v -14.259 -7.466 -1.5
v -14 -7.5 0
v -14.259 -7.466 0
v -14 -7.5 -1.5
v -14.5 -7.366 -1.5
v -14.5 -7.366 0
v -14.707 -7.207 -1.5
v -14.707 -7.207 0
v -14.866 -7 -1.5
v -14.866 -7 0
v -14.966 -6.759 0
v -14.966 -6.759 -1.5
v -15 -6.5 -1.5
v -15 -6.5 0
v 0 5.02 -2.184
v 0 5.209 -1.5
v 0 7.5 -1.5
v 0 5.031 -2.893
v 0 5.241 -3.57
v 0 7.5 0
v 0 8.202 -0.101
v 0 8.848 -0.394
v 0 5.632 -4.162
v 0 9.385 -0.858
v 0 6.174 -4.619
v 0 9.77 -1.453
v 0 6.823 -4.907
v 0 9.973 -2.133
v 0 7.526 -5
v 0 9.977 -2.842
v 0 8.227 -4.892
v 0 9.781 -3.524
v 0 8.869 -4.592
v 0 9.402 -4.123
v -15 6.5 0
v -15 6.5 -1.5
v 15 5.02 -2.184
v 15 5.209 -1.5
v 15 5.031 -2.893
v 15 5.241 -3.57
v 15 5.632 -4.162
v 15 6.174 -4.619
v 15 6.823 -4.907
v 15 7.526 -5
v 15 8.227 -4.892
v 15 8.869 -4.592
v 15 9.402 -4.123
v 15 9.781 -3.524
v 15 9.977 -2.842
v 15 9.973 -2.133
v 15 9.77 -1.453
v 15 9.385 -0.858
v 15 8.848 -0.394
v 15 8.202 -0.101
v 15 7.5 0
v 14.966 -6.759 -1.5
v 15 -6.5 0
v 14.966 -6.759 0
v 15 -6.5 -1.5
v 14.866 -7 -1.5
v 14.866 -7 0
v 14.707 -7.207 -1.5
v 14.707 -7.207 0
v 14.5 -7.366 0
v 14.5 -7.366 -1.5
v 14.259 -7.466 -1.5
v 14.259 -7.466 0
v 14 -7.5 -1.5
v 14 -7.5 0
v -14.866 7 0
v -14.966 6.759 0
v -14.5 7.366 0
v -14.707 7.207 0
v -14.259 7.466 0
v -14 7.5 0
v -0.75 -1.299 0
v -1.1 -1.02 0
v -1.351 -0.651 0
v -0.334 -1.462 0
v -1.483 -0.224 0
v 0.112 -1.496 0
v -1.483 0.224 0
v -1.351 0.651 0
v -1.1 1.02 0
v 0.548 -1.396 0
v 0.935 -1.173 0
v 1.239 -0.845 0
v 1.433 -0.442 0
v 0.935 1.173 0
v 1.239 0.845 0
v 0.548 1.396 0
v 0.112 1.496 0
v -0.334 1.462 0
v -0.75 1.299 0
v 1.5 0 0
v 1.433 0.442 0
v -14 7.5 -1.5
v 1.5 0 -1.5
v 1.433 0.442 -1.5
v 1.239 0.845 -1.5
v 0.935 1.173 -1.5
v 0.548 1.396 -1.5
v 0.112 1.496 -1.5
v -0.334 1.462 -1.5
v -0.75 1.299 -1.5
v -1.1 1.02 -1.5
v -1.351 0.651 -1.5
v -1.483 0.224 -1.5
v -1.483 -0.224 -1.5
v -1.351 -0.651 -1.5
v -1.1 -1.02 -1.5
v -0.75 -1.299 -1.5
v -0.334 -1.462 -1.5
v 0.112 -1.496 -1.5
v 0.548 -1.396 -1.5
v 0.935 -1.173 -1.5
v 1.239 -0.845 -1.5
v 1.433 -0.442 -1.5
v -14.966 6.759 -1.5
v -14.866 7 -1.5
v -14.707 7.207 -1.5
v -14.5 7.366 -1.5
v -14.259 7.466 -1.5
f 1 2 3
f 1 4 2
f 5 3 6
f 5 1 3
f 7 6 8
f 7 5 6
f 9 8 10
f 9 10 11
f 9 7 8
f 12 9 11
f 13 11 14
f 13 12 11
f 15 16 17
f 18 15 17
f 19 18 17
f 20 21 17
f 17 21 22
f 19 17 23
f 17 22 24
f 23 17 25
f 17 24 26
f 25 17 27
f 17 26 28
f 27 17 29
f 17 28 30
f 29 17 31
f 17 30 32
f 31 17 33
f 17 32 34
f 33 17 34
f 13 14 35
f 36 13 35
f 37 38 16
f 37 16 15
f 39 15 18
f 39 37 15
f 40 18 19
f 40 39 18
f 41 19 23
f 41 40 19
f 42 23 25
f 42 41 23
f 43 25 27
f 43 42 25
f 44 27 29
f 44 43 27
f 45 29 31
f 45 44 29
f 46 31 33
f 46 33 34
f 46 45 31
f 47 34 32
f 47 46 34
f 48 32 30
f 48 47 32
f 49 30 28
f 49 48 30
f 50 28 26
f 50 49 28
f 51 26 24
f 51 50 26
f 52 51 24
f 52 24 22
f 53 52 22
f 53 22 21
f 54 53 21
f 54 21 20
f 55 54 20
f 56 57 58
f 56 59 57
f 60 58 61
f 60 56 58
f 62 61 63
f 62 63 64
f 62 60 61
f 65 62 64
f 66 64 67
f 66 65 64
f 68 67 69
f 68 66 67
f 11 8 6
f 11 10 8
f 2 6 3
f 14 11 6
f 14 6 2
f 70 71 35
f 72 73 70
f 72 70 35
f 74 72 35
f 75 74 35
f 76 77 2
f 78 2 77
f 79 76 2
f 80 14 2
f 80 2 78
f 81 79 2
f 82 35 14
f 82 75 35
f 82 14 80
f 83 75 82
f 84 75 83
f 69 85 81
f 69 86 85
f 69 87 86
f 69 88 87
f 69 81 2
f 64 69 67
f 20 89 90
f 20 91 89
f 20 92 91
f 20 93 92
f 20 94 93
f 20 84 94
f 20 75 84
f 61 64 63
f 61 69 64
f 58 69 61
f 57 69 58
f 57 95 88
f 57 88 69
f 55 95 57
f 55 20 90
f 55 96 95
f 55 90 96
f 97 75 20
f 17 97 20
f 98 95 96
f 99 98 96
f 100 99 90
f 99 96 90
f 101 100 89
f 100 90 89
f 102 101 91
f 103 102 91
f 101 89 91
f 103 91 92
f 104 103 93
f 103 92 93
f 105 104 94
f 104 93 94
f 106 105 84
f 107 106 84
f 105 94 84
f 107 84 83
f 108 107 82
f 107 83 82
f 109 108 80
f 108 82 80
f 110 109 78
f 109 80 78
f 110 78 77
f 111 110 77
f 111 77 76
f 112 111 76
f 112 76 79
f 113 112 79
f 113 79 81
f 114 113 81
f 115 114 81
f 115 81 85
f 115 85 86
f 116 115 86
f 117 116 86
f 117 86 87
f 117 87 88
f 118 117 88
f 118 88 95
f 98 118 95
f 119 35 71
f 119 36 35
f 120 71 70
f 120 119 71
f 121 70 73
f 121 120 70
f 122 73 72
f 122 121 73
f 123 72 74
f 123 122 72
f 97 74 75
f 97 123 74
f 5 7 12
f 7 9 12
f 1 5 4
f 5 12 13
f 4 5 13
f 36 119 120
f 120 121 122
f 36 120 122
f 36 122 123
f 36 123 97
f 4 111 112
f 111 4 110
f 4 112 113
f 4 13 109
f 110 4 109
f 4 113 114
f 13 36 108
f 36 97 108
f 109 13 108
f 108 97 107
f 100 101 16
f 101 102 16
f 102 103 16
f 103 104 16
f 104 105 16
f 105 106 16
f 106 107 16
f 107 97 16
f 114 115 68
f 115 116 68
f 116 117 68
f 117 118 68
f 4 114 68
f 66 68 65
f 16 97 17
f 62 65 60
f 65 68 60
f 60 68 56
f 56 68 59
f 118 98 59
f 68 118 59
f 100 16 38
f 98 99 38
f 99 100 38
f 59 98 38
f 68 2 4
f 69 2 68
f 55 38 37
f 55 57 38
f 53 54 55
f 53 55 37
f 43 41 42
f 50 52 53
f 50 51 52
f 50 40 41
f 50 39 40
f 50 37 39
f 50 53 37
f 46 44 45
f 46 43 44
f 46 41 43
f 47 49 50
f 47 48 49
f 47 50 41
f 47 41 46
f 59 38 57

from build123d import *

# Parameters (mm, degrees)
SKETCH_1_W             = 30
SKETCH_1_H             = 15
SM_BASE_FLANGE_1_DEPTH = 1.5
SKETCH_6_R             = 2.5
EXTRUDE_1_DEPTH        = 15
SKETCH_7_R             = 1.5
CUT_EXTRUDE_1_DEPTH    = 15
FILLET_1_R             = 1


# Sheet-metal steps are written as plain solids
with BuildPart() as part:
    # Sketch 1 → 基体-法兰1 (new body)
    with BuildSketch(Plane.XY):
        Rectangle(SKETCH_1_W, SKETCH_1_H)
    extrude(amount=-SM_BASE_FLANGE_1_DEPTH)

    # 草图6 → 凸台-拉伸1 (add)
    with BuildSketch(Plane(origin=(15, 0, 0), x_dir=(0, 0, -1), z_dir=(1, 0, 0))):
        with Locations((2.5, 7.5)):
            Circle(SKETCH_6_R)
    extrude(amount=-EXTRUDE_1_DEPTH)

    # 草图7 → 切除-拉伸1 (cut)
    with BuildSketch(Plane.XY):
        Circle(SKETCH_7_R)
    extrude(amount=-CUT_EXTRUDE_1_DEPTH, mode=Mode.SUBTRACT)

    # 圆角1
    fillet_1_edges = [part.edges().sort_by_distance(p)[0] for p in [
        (15, -7.5, -0.75),
        (-15, -7.5, -0.75),
        (-15, 7.5, -0.75),
    ]]
    fillet(fillet_1_edges, radius=FILLET_1_R)


solid = part.part
